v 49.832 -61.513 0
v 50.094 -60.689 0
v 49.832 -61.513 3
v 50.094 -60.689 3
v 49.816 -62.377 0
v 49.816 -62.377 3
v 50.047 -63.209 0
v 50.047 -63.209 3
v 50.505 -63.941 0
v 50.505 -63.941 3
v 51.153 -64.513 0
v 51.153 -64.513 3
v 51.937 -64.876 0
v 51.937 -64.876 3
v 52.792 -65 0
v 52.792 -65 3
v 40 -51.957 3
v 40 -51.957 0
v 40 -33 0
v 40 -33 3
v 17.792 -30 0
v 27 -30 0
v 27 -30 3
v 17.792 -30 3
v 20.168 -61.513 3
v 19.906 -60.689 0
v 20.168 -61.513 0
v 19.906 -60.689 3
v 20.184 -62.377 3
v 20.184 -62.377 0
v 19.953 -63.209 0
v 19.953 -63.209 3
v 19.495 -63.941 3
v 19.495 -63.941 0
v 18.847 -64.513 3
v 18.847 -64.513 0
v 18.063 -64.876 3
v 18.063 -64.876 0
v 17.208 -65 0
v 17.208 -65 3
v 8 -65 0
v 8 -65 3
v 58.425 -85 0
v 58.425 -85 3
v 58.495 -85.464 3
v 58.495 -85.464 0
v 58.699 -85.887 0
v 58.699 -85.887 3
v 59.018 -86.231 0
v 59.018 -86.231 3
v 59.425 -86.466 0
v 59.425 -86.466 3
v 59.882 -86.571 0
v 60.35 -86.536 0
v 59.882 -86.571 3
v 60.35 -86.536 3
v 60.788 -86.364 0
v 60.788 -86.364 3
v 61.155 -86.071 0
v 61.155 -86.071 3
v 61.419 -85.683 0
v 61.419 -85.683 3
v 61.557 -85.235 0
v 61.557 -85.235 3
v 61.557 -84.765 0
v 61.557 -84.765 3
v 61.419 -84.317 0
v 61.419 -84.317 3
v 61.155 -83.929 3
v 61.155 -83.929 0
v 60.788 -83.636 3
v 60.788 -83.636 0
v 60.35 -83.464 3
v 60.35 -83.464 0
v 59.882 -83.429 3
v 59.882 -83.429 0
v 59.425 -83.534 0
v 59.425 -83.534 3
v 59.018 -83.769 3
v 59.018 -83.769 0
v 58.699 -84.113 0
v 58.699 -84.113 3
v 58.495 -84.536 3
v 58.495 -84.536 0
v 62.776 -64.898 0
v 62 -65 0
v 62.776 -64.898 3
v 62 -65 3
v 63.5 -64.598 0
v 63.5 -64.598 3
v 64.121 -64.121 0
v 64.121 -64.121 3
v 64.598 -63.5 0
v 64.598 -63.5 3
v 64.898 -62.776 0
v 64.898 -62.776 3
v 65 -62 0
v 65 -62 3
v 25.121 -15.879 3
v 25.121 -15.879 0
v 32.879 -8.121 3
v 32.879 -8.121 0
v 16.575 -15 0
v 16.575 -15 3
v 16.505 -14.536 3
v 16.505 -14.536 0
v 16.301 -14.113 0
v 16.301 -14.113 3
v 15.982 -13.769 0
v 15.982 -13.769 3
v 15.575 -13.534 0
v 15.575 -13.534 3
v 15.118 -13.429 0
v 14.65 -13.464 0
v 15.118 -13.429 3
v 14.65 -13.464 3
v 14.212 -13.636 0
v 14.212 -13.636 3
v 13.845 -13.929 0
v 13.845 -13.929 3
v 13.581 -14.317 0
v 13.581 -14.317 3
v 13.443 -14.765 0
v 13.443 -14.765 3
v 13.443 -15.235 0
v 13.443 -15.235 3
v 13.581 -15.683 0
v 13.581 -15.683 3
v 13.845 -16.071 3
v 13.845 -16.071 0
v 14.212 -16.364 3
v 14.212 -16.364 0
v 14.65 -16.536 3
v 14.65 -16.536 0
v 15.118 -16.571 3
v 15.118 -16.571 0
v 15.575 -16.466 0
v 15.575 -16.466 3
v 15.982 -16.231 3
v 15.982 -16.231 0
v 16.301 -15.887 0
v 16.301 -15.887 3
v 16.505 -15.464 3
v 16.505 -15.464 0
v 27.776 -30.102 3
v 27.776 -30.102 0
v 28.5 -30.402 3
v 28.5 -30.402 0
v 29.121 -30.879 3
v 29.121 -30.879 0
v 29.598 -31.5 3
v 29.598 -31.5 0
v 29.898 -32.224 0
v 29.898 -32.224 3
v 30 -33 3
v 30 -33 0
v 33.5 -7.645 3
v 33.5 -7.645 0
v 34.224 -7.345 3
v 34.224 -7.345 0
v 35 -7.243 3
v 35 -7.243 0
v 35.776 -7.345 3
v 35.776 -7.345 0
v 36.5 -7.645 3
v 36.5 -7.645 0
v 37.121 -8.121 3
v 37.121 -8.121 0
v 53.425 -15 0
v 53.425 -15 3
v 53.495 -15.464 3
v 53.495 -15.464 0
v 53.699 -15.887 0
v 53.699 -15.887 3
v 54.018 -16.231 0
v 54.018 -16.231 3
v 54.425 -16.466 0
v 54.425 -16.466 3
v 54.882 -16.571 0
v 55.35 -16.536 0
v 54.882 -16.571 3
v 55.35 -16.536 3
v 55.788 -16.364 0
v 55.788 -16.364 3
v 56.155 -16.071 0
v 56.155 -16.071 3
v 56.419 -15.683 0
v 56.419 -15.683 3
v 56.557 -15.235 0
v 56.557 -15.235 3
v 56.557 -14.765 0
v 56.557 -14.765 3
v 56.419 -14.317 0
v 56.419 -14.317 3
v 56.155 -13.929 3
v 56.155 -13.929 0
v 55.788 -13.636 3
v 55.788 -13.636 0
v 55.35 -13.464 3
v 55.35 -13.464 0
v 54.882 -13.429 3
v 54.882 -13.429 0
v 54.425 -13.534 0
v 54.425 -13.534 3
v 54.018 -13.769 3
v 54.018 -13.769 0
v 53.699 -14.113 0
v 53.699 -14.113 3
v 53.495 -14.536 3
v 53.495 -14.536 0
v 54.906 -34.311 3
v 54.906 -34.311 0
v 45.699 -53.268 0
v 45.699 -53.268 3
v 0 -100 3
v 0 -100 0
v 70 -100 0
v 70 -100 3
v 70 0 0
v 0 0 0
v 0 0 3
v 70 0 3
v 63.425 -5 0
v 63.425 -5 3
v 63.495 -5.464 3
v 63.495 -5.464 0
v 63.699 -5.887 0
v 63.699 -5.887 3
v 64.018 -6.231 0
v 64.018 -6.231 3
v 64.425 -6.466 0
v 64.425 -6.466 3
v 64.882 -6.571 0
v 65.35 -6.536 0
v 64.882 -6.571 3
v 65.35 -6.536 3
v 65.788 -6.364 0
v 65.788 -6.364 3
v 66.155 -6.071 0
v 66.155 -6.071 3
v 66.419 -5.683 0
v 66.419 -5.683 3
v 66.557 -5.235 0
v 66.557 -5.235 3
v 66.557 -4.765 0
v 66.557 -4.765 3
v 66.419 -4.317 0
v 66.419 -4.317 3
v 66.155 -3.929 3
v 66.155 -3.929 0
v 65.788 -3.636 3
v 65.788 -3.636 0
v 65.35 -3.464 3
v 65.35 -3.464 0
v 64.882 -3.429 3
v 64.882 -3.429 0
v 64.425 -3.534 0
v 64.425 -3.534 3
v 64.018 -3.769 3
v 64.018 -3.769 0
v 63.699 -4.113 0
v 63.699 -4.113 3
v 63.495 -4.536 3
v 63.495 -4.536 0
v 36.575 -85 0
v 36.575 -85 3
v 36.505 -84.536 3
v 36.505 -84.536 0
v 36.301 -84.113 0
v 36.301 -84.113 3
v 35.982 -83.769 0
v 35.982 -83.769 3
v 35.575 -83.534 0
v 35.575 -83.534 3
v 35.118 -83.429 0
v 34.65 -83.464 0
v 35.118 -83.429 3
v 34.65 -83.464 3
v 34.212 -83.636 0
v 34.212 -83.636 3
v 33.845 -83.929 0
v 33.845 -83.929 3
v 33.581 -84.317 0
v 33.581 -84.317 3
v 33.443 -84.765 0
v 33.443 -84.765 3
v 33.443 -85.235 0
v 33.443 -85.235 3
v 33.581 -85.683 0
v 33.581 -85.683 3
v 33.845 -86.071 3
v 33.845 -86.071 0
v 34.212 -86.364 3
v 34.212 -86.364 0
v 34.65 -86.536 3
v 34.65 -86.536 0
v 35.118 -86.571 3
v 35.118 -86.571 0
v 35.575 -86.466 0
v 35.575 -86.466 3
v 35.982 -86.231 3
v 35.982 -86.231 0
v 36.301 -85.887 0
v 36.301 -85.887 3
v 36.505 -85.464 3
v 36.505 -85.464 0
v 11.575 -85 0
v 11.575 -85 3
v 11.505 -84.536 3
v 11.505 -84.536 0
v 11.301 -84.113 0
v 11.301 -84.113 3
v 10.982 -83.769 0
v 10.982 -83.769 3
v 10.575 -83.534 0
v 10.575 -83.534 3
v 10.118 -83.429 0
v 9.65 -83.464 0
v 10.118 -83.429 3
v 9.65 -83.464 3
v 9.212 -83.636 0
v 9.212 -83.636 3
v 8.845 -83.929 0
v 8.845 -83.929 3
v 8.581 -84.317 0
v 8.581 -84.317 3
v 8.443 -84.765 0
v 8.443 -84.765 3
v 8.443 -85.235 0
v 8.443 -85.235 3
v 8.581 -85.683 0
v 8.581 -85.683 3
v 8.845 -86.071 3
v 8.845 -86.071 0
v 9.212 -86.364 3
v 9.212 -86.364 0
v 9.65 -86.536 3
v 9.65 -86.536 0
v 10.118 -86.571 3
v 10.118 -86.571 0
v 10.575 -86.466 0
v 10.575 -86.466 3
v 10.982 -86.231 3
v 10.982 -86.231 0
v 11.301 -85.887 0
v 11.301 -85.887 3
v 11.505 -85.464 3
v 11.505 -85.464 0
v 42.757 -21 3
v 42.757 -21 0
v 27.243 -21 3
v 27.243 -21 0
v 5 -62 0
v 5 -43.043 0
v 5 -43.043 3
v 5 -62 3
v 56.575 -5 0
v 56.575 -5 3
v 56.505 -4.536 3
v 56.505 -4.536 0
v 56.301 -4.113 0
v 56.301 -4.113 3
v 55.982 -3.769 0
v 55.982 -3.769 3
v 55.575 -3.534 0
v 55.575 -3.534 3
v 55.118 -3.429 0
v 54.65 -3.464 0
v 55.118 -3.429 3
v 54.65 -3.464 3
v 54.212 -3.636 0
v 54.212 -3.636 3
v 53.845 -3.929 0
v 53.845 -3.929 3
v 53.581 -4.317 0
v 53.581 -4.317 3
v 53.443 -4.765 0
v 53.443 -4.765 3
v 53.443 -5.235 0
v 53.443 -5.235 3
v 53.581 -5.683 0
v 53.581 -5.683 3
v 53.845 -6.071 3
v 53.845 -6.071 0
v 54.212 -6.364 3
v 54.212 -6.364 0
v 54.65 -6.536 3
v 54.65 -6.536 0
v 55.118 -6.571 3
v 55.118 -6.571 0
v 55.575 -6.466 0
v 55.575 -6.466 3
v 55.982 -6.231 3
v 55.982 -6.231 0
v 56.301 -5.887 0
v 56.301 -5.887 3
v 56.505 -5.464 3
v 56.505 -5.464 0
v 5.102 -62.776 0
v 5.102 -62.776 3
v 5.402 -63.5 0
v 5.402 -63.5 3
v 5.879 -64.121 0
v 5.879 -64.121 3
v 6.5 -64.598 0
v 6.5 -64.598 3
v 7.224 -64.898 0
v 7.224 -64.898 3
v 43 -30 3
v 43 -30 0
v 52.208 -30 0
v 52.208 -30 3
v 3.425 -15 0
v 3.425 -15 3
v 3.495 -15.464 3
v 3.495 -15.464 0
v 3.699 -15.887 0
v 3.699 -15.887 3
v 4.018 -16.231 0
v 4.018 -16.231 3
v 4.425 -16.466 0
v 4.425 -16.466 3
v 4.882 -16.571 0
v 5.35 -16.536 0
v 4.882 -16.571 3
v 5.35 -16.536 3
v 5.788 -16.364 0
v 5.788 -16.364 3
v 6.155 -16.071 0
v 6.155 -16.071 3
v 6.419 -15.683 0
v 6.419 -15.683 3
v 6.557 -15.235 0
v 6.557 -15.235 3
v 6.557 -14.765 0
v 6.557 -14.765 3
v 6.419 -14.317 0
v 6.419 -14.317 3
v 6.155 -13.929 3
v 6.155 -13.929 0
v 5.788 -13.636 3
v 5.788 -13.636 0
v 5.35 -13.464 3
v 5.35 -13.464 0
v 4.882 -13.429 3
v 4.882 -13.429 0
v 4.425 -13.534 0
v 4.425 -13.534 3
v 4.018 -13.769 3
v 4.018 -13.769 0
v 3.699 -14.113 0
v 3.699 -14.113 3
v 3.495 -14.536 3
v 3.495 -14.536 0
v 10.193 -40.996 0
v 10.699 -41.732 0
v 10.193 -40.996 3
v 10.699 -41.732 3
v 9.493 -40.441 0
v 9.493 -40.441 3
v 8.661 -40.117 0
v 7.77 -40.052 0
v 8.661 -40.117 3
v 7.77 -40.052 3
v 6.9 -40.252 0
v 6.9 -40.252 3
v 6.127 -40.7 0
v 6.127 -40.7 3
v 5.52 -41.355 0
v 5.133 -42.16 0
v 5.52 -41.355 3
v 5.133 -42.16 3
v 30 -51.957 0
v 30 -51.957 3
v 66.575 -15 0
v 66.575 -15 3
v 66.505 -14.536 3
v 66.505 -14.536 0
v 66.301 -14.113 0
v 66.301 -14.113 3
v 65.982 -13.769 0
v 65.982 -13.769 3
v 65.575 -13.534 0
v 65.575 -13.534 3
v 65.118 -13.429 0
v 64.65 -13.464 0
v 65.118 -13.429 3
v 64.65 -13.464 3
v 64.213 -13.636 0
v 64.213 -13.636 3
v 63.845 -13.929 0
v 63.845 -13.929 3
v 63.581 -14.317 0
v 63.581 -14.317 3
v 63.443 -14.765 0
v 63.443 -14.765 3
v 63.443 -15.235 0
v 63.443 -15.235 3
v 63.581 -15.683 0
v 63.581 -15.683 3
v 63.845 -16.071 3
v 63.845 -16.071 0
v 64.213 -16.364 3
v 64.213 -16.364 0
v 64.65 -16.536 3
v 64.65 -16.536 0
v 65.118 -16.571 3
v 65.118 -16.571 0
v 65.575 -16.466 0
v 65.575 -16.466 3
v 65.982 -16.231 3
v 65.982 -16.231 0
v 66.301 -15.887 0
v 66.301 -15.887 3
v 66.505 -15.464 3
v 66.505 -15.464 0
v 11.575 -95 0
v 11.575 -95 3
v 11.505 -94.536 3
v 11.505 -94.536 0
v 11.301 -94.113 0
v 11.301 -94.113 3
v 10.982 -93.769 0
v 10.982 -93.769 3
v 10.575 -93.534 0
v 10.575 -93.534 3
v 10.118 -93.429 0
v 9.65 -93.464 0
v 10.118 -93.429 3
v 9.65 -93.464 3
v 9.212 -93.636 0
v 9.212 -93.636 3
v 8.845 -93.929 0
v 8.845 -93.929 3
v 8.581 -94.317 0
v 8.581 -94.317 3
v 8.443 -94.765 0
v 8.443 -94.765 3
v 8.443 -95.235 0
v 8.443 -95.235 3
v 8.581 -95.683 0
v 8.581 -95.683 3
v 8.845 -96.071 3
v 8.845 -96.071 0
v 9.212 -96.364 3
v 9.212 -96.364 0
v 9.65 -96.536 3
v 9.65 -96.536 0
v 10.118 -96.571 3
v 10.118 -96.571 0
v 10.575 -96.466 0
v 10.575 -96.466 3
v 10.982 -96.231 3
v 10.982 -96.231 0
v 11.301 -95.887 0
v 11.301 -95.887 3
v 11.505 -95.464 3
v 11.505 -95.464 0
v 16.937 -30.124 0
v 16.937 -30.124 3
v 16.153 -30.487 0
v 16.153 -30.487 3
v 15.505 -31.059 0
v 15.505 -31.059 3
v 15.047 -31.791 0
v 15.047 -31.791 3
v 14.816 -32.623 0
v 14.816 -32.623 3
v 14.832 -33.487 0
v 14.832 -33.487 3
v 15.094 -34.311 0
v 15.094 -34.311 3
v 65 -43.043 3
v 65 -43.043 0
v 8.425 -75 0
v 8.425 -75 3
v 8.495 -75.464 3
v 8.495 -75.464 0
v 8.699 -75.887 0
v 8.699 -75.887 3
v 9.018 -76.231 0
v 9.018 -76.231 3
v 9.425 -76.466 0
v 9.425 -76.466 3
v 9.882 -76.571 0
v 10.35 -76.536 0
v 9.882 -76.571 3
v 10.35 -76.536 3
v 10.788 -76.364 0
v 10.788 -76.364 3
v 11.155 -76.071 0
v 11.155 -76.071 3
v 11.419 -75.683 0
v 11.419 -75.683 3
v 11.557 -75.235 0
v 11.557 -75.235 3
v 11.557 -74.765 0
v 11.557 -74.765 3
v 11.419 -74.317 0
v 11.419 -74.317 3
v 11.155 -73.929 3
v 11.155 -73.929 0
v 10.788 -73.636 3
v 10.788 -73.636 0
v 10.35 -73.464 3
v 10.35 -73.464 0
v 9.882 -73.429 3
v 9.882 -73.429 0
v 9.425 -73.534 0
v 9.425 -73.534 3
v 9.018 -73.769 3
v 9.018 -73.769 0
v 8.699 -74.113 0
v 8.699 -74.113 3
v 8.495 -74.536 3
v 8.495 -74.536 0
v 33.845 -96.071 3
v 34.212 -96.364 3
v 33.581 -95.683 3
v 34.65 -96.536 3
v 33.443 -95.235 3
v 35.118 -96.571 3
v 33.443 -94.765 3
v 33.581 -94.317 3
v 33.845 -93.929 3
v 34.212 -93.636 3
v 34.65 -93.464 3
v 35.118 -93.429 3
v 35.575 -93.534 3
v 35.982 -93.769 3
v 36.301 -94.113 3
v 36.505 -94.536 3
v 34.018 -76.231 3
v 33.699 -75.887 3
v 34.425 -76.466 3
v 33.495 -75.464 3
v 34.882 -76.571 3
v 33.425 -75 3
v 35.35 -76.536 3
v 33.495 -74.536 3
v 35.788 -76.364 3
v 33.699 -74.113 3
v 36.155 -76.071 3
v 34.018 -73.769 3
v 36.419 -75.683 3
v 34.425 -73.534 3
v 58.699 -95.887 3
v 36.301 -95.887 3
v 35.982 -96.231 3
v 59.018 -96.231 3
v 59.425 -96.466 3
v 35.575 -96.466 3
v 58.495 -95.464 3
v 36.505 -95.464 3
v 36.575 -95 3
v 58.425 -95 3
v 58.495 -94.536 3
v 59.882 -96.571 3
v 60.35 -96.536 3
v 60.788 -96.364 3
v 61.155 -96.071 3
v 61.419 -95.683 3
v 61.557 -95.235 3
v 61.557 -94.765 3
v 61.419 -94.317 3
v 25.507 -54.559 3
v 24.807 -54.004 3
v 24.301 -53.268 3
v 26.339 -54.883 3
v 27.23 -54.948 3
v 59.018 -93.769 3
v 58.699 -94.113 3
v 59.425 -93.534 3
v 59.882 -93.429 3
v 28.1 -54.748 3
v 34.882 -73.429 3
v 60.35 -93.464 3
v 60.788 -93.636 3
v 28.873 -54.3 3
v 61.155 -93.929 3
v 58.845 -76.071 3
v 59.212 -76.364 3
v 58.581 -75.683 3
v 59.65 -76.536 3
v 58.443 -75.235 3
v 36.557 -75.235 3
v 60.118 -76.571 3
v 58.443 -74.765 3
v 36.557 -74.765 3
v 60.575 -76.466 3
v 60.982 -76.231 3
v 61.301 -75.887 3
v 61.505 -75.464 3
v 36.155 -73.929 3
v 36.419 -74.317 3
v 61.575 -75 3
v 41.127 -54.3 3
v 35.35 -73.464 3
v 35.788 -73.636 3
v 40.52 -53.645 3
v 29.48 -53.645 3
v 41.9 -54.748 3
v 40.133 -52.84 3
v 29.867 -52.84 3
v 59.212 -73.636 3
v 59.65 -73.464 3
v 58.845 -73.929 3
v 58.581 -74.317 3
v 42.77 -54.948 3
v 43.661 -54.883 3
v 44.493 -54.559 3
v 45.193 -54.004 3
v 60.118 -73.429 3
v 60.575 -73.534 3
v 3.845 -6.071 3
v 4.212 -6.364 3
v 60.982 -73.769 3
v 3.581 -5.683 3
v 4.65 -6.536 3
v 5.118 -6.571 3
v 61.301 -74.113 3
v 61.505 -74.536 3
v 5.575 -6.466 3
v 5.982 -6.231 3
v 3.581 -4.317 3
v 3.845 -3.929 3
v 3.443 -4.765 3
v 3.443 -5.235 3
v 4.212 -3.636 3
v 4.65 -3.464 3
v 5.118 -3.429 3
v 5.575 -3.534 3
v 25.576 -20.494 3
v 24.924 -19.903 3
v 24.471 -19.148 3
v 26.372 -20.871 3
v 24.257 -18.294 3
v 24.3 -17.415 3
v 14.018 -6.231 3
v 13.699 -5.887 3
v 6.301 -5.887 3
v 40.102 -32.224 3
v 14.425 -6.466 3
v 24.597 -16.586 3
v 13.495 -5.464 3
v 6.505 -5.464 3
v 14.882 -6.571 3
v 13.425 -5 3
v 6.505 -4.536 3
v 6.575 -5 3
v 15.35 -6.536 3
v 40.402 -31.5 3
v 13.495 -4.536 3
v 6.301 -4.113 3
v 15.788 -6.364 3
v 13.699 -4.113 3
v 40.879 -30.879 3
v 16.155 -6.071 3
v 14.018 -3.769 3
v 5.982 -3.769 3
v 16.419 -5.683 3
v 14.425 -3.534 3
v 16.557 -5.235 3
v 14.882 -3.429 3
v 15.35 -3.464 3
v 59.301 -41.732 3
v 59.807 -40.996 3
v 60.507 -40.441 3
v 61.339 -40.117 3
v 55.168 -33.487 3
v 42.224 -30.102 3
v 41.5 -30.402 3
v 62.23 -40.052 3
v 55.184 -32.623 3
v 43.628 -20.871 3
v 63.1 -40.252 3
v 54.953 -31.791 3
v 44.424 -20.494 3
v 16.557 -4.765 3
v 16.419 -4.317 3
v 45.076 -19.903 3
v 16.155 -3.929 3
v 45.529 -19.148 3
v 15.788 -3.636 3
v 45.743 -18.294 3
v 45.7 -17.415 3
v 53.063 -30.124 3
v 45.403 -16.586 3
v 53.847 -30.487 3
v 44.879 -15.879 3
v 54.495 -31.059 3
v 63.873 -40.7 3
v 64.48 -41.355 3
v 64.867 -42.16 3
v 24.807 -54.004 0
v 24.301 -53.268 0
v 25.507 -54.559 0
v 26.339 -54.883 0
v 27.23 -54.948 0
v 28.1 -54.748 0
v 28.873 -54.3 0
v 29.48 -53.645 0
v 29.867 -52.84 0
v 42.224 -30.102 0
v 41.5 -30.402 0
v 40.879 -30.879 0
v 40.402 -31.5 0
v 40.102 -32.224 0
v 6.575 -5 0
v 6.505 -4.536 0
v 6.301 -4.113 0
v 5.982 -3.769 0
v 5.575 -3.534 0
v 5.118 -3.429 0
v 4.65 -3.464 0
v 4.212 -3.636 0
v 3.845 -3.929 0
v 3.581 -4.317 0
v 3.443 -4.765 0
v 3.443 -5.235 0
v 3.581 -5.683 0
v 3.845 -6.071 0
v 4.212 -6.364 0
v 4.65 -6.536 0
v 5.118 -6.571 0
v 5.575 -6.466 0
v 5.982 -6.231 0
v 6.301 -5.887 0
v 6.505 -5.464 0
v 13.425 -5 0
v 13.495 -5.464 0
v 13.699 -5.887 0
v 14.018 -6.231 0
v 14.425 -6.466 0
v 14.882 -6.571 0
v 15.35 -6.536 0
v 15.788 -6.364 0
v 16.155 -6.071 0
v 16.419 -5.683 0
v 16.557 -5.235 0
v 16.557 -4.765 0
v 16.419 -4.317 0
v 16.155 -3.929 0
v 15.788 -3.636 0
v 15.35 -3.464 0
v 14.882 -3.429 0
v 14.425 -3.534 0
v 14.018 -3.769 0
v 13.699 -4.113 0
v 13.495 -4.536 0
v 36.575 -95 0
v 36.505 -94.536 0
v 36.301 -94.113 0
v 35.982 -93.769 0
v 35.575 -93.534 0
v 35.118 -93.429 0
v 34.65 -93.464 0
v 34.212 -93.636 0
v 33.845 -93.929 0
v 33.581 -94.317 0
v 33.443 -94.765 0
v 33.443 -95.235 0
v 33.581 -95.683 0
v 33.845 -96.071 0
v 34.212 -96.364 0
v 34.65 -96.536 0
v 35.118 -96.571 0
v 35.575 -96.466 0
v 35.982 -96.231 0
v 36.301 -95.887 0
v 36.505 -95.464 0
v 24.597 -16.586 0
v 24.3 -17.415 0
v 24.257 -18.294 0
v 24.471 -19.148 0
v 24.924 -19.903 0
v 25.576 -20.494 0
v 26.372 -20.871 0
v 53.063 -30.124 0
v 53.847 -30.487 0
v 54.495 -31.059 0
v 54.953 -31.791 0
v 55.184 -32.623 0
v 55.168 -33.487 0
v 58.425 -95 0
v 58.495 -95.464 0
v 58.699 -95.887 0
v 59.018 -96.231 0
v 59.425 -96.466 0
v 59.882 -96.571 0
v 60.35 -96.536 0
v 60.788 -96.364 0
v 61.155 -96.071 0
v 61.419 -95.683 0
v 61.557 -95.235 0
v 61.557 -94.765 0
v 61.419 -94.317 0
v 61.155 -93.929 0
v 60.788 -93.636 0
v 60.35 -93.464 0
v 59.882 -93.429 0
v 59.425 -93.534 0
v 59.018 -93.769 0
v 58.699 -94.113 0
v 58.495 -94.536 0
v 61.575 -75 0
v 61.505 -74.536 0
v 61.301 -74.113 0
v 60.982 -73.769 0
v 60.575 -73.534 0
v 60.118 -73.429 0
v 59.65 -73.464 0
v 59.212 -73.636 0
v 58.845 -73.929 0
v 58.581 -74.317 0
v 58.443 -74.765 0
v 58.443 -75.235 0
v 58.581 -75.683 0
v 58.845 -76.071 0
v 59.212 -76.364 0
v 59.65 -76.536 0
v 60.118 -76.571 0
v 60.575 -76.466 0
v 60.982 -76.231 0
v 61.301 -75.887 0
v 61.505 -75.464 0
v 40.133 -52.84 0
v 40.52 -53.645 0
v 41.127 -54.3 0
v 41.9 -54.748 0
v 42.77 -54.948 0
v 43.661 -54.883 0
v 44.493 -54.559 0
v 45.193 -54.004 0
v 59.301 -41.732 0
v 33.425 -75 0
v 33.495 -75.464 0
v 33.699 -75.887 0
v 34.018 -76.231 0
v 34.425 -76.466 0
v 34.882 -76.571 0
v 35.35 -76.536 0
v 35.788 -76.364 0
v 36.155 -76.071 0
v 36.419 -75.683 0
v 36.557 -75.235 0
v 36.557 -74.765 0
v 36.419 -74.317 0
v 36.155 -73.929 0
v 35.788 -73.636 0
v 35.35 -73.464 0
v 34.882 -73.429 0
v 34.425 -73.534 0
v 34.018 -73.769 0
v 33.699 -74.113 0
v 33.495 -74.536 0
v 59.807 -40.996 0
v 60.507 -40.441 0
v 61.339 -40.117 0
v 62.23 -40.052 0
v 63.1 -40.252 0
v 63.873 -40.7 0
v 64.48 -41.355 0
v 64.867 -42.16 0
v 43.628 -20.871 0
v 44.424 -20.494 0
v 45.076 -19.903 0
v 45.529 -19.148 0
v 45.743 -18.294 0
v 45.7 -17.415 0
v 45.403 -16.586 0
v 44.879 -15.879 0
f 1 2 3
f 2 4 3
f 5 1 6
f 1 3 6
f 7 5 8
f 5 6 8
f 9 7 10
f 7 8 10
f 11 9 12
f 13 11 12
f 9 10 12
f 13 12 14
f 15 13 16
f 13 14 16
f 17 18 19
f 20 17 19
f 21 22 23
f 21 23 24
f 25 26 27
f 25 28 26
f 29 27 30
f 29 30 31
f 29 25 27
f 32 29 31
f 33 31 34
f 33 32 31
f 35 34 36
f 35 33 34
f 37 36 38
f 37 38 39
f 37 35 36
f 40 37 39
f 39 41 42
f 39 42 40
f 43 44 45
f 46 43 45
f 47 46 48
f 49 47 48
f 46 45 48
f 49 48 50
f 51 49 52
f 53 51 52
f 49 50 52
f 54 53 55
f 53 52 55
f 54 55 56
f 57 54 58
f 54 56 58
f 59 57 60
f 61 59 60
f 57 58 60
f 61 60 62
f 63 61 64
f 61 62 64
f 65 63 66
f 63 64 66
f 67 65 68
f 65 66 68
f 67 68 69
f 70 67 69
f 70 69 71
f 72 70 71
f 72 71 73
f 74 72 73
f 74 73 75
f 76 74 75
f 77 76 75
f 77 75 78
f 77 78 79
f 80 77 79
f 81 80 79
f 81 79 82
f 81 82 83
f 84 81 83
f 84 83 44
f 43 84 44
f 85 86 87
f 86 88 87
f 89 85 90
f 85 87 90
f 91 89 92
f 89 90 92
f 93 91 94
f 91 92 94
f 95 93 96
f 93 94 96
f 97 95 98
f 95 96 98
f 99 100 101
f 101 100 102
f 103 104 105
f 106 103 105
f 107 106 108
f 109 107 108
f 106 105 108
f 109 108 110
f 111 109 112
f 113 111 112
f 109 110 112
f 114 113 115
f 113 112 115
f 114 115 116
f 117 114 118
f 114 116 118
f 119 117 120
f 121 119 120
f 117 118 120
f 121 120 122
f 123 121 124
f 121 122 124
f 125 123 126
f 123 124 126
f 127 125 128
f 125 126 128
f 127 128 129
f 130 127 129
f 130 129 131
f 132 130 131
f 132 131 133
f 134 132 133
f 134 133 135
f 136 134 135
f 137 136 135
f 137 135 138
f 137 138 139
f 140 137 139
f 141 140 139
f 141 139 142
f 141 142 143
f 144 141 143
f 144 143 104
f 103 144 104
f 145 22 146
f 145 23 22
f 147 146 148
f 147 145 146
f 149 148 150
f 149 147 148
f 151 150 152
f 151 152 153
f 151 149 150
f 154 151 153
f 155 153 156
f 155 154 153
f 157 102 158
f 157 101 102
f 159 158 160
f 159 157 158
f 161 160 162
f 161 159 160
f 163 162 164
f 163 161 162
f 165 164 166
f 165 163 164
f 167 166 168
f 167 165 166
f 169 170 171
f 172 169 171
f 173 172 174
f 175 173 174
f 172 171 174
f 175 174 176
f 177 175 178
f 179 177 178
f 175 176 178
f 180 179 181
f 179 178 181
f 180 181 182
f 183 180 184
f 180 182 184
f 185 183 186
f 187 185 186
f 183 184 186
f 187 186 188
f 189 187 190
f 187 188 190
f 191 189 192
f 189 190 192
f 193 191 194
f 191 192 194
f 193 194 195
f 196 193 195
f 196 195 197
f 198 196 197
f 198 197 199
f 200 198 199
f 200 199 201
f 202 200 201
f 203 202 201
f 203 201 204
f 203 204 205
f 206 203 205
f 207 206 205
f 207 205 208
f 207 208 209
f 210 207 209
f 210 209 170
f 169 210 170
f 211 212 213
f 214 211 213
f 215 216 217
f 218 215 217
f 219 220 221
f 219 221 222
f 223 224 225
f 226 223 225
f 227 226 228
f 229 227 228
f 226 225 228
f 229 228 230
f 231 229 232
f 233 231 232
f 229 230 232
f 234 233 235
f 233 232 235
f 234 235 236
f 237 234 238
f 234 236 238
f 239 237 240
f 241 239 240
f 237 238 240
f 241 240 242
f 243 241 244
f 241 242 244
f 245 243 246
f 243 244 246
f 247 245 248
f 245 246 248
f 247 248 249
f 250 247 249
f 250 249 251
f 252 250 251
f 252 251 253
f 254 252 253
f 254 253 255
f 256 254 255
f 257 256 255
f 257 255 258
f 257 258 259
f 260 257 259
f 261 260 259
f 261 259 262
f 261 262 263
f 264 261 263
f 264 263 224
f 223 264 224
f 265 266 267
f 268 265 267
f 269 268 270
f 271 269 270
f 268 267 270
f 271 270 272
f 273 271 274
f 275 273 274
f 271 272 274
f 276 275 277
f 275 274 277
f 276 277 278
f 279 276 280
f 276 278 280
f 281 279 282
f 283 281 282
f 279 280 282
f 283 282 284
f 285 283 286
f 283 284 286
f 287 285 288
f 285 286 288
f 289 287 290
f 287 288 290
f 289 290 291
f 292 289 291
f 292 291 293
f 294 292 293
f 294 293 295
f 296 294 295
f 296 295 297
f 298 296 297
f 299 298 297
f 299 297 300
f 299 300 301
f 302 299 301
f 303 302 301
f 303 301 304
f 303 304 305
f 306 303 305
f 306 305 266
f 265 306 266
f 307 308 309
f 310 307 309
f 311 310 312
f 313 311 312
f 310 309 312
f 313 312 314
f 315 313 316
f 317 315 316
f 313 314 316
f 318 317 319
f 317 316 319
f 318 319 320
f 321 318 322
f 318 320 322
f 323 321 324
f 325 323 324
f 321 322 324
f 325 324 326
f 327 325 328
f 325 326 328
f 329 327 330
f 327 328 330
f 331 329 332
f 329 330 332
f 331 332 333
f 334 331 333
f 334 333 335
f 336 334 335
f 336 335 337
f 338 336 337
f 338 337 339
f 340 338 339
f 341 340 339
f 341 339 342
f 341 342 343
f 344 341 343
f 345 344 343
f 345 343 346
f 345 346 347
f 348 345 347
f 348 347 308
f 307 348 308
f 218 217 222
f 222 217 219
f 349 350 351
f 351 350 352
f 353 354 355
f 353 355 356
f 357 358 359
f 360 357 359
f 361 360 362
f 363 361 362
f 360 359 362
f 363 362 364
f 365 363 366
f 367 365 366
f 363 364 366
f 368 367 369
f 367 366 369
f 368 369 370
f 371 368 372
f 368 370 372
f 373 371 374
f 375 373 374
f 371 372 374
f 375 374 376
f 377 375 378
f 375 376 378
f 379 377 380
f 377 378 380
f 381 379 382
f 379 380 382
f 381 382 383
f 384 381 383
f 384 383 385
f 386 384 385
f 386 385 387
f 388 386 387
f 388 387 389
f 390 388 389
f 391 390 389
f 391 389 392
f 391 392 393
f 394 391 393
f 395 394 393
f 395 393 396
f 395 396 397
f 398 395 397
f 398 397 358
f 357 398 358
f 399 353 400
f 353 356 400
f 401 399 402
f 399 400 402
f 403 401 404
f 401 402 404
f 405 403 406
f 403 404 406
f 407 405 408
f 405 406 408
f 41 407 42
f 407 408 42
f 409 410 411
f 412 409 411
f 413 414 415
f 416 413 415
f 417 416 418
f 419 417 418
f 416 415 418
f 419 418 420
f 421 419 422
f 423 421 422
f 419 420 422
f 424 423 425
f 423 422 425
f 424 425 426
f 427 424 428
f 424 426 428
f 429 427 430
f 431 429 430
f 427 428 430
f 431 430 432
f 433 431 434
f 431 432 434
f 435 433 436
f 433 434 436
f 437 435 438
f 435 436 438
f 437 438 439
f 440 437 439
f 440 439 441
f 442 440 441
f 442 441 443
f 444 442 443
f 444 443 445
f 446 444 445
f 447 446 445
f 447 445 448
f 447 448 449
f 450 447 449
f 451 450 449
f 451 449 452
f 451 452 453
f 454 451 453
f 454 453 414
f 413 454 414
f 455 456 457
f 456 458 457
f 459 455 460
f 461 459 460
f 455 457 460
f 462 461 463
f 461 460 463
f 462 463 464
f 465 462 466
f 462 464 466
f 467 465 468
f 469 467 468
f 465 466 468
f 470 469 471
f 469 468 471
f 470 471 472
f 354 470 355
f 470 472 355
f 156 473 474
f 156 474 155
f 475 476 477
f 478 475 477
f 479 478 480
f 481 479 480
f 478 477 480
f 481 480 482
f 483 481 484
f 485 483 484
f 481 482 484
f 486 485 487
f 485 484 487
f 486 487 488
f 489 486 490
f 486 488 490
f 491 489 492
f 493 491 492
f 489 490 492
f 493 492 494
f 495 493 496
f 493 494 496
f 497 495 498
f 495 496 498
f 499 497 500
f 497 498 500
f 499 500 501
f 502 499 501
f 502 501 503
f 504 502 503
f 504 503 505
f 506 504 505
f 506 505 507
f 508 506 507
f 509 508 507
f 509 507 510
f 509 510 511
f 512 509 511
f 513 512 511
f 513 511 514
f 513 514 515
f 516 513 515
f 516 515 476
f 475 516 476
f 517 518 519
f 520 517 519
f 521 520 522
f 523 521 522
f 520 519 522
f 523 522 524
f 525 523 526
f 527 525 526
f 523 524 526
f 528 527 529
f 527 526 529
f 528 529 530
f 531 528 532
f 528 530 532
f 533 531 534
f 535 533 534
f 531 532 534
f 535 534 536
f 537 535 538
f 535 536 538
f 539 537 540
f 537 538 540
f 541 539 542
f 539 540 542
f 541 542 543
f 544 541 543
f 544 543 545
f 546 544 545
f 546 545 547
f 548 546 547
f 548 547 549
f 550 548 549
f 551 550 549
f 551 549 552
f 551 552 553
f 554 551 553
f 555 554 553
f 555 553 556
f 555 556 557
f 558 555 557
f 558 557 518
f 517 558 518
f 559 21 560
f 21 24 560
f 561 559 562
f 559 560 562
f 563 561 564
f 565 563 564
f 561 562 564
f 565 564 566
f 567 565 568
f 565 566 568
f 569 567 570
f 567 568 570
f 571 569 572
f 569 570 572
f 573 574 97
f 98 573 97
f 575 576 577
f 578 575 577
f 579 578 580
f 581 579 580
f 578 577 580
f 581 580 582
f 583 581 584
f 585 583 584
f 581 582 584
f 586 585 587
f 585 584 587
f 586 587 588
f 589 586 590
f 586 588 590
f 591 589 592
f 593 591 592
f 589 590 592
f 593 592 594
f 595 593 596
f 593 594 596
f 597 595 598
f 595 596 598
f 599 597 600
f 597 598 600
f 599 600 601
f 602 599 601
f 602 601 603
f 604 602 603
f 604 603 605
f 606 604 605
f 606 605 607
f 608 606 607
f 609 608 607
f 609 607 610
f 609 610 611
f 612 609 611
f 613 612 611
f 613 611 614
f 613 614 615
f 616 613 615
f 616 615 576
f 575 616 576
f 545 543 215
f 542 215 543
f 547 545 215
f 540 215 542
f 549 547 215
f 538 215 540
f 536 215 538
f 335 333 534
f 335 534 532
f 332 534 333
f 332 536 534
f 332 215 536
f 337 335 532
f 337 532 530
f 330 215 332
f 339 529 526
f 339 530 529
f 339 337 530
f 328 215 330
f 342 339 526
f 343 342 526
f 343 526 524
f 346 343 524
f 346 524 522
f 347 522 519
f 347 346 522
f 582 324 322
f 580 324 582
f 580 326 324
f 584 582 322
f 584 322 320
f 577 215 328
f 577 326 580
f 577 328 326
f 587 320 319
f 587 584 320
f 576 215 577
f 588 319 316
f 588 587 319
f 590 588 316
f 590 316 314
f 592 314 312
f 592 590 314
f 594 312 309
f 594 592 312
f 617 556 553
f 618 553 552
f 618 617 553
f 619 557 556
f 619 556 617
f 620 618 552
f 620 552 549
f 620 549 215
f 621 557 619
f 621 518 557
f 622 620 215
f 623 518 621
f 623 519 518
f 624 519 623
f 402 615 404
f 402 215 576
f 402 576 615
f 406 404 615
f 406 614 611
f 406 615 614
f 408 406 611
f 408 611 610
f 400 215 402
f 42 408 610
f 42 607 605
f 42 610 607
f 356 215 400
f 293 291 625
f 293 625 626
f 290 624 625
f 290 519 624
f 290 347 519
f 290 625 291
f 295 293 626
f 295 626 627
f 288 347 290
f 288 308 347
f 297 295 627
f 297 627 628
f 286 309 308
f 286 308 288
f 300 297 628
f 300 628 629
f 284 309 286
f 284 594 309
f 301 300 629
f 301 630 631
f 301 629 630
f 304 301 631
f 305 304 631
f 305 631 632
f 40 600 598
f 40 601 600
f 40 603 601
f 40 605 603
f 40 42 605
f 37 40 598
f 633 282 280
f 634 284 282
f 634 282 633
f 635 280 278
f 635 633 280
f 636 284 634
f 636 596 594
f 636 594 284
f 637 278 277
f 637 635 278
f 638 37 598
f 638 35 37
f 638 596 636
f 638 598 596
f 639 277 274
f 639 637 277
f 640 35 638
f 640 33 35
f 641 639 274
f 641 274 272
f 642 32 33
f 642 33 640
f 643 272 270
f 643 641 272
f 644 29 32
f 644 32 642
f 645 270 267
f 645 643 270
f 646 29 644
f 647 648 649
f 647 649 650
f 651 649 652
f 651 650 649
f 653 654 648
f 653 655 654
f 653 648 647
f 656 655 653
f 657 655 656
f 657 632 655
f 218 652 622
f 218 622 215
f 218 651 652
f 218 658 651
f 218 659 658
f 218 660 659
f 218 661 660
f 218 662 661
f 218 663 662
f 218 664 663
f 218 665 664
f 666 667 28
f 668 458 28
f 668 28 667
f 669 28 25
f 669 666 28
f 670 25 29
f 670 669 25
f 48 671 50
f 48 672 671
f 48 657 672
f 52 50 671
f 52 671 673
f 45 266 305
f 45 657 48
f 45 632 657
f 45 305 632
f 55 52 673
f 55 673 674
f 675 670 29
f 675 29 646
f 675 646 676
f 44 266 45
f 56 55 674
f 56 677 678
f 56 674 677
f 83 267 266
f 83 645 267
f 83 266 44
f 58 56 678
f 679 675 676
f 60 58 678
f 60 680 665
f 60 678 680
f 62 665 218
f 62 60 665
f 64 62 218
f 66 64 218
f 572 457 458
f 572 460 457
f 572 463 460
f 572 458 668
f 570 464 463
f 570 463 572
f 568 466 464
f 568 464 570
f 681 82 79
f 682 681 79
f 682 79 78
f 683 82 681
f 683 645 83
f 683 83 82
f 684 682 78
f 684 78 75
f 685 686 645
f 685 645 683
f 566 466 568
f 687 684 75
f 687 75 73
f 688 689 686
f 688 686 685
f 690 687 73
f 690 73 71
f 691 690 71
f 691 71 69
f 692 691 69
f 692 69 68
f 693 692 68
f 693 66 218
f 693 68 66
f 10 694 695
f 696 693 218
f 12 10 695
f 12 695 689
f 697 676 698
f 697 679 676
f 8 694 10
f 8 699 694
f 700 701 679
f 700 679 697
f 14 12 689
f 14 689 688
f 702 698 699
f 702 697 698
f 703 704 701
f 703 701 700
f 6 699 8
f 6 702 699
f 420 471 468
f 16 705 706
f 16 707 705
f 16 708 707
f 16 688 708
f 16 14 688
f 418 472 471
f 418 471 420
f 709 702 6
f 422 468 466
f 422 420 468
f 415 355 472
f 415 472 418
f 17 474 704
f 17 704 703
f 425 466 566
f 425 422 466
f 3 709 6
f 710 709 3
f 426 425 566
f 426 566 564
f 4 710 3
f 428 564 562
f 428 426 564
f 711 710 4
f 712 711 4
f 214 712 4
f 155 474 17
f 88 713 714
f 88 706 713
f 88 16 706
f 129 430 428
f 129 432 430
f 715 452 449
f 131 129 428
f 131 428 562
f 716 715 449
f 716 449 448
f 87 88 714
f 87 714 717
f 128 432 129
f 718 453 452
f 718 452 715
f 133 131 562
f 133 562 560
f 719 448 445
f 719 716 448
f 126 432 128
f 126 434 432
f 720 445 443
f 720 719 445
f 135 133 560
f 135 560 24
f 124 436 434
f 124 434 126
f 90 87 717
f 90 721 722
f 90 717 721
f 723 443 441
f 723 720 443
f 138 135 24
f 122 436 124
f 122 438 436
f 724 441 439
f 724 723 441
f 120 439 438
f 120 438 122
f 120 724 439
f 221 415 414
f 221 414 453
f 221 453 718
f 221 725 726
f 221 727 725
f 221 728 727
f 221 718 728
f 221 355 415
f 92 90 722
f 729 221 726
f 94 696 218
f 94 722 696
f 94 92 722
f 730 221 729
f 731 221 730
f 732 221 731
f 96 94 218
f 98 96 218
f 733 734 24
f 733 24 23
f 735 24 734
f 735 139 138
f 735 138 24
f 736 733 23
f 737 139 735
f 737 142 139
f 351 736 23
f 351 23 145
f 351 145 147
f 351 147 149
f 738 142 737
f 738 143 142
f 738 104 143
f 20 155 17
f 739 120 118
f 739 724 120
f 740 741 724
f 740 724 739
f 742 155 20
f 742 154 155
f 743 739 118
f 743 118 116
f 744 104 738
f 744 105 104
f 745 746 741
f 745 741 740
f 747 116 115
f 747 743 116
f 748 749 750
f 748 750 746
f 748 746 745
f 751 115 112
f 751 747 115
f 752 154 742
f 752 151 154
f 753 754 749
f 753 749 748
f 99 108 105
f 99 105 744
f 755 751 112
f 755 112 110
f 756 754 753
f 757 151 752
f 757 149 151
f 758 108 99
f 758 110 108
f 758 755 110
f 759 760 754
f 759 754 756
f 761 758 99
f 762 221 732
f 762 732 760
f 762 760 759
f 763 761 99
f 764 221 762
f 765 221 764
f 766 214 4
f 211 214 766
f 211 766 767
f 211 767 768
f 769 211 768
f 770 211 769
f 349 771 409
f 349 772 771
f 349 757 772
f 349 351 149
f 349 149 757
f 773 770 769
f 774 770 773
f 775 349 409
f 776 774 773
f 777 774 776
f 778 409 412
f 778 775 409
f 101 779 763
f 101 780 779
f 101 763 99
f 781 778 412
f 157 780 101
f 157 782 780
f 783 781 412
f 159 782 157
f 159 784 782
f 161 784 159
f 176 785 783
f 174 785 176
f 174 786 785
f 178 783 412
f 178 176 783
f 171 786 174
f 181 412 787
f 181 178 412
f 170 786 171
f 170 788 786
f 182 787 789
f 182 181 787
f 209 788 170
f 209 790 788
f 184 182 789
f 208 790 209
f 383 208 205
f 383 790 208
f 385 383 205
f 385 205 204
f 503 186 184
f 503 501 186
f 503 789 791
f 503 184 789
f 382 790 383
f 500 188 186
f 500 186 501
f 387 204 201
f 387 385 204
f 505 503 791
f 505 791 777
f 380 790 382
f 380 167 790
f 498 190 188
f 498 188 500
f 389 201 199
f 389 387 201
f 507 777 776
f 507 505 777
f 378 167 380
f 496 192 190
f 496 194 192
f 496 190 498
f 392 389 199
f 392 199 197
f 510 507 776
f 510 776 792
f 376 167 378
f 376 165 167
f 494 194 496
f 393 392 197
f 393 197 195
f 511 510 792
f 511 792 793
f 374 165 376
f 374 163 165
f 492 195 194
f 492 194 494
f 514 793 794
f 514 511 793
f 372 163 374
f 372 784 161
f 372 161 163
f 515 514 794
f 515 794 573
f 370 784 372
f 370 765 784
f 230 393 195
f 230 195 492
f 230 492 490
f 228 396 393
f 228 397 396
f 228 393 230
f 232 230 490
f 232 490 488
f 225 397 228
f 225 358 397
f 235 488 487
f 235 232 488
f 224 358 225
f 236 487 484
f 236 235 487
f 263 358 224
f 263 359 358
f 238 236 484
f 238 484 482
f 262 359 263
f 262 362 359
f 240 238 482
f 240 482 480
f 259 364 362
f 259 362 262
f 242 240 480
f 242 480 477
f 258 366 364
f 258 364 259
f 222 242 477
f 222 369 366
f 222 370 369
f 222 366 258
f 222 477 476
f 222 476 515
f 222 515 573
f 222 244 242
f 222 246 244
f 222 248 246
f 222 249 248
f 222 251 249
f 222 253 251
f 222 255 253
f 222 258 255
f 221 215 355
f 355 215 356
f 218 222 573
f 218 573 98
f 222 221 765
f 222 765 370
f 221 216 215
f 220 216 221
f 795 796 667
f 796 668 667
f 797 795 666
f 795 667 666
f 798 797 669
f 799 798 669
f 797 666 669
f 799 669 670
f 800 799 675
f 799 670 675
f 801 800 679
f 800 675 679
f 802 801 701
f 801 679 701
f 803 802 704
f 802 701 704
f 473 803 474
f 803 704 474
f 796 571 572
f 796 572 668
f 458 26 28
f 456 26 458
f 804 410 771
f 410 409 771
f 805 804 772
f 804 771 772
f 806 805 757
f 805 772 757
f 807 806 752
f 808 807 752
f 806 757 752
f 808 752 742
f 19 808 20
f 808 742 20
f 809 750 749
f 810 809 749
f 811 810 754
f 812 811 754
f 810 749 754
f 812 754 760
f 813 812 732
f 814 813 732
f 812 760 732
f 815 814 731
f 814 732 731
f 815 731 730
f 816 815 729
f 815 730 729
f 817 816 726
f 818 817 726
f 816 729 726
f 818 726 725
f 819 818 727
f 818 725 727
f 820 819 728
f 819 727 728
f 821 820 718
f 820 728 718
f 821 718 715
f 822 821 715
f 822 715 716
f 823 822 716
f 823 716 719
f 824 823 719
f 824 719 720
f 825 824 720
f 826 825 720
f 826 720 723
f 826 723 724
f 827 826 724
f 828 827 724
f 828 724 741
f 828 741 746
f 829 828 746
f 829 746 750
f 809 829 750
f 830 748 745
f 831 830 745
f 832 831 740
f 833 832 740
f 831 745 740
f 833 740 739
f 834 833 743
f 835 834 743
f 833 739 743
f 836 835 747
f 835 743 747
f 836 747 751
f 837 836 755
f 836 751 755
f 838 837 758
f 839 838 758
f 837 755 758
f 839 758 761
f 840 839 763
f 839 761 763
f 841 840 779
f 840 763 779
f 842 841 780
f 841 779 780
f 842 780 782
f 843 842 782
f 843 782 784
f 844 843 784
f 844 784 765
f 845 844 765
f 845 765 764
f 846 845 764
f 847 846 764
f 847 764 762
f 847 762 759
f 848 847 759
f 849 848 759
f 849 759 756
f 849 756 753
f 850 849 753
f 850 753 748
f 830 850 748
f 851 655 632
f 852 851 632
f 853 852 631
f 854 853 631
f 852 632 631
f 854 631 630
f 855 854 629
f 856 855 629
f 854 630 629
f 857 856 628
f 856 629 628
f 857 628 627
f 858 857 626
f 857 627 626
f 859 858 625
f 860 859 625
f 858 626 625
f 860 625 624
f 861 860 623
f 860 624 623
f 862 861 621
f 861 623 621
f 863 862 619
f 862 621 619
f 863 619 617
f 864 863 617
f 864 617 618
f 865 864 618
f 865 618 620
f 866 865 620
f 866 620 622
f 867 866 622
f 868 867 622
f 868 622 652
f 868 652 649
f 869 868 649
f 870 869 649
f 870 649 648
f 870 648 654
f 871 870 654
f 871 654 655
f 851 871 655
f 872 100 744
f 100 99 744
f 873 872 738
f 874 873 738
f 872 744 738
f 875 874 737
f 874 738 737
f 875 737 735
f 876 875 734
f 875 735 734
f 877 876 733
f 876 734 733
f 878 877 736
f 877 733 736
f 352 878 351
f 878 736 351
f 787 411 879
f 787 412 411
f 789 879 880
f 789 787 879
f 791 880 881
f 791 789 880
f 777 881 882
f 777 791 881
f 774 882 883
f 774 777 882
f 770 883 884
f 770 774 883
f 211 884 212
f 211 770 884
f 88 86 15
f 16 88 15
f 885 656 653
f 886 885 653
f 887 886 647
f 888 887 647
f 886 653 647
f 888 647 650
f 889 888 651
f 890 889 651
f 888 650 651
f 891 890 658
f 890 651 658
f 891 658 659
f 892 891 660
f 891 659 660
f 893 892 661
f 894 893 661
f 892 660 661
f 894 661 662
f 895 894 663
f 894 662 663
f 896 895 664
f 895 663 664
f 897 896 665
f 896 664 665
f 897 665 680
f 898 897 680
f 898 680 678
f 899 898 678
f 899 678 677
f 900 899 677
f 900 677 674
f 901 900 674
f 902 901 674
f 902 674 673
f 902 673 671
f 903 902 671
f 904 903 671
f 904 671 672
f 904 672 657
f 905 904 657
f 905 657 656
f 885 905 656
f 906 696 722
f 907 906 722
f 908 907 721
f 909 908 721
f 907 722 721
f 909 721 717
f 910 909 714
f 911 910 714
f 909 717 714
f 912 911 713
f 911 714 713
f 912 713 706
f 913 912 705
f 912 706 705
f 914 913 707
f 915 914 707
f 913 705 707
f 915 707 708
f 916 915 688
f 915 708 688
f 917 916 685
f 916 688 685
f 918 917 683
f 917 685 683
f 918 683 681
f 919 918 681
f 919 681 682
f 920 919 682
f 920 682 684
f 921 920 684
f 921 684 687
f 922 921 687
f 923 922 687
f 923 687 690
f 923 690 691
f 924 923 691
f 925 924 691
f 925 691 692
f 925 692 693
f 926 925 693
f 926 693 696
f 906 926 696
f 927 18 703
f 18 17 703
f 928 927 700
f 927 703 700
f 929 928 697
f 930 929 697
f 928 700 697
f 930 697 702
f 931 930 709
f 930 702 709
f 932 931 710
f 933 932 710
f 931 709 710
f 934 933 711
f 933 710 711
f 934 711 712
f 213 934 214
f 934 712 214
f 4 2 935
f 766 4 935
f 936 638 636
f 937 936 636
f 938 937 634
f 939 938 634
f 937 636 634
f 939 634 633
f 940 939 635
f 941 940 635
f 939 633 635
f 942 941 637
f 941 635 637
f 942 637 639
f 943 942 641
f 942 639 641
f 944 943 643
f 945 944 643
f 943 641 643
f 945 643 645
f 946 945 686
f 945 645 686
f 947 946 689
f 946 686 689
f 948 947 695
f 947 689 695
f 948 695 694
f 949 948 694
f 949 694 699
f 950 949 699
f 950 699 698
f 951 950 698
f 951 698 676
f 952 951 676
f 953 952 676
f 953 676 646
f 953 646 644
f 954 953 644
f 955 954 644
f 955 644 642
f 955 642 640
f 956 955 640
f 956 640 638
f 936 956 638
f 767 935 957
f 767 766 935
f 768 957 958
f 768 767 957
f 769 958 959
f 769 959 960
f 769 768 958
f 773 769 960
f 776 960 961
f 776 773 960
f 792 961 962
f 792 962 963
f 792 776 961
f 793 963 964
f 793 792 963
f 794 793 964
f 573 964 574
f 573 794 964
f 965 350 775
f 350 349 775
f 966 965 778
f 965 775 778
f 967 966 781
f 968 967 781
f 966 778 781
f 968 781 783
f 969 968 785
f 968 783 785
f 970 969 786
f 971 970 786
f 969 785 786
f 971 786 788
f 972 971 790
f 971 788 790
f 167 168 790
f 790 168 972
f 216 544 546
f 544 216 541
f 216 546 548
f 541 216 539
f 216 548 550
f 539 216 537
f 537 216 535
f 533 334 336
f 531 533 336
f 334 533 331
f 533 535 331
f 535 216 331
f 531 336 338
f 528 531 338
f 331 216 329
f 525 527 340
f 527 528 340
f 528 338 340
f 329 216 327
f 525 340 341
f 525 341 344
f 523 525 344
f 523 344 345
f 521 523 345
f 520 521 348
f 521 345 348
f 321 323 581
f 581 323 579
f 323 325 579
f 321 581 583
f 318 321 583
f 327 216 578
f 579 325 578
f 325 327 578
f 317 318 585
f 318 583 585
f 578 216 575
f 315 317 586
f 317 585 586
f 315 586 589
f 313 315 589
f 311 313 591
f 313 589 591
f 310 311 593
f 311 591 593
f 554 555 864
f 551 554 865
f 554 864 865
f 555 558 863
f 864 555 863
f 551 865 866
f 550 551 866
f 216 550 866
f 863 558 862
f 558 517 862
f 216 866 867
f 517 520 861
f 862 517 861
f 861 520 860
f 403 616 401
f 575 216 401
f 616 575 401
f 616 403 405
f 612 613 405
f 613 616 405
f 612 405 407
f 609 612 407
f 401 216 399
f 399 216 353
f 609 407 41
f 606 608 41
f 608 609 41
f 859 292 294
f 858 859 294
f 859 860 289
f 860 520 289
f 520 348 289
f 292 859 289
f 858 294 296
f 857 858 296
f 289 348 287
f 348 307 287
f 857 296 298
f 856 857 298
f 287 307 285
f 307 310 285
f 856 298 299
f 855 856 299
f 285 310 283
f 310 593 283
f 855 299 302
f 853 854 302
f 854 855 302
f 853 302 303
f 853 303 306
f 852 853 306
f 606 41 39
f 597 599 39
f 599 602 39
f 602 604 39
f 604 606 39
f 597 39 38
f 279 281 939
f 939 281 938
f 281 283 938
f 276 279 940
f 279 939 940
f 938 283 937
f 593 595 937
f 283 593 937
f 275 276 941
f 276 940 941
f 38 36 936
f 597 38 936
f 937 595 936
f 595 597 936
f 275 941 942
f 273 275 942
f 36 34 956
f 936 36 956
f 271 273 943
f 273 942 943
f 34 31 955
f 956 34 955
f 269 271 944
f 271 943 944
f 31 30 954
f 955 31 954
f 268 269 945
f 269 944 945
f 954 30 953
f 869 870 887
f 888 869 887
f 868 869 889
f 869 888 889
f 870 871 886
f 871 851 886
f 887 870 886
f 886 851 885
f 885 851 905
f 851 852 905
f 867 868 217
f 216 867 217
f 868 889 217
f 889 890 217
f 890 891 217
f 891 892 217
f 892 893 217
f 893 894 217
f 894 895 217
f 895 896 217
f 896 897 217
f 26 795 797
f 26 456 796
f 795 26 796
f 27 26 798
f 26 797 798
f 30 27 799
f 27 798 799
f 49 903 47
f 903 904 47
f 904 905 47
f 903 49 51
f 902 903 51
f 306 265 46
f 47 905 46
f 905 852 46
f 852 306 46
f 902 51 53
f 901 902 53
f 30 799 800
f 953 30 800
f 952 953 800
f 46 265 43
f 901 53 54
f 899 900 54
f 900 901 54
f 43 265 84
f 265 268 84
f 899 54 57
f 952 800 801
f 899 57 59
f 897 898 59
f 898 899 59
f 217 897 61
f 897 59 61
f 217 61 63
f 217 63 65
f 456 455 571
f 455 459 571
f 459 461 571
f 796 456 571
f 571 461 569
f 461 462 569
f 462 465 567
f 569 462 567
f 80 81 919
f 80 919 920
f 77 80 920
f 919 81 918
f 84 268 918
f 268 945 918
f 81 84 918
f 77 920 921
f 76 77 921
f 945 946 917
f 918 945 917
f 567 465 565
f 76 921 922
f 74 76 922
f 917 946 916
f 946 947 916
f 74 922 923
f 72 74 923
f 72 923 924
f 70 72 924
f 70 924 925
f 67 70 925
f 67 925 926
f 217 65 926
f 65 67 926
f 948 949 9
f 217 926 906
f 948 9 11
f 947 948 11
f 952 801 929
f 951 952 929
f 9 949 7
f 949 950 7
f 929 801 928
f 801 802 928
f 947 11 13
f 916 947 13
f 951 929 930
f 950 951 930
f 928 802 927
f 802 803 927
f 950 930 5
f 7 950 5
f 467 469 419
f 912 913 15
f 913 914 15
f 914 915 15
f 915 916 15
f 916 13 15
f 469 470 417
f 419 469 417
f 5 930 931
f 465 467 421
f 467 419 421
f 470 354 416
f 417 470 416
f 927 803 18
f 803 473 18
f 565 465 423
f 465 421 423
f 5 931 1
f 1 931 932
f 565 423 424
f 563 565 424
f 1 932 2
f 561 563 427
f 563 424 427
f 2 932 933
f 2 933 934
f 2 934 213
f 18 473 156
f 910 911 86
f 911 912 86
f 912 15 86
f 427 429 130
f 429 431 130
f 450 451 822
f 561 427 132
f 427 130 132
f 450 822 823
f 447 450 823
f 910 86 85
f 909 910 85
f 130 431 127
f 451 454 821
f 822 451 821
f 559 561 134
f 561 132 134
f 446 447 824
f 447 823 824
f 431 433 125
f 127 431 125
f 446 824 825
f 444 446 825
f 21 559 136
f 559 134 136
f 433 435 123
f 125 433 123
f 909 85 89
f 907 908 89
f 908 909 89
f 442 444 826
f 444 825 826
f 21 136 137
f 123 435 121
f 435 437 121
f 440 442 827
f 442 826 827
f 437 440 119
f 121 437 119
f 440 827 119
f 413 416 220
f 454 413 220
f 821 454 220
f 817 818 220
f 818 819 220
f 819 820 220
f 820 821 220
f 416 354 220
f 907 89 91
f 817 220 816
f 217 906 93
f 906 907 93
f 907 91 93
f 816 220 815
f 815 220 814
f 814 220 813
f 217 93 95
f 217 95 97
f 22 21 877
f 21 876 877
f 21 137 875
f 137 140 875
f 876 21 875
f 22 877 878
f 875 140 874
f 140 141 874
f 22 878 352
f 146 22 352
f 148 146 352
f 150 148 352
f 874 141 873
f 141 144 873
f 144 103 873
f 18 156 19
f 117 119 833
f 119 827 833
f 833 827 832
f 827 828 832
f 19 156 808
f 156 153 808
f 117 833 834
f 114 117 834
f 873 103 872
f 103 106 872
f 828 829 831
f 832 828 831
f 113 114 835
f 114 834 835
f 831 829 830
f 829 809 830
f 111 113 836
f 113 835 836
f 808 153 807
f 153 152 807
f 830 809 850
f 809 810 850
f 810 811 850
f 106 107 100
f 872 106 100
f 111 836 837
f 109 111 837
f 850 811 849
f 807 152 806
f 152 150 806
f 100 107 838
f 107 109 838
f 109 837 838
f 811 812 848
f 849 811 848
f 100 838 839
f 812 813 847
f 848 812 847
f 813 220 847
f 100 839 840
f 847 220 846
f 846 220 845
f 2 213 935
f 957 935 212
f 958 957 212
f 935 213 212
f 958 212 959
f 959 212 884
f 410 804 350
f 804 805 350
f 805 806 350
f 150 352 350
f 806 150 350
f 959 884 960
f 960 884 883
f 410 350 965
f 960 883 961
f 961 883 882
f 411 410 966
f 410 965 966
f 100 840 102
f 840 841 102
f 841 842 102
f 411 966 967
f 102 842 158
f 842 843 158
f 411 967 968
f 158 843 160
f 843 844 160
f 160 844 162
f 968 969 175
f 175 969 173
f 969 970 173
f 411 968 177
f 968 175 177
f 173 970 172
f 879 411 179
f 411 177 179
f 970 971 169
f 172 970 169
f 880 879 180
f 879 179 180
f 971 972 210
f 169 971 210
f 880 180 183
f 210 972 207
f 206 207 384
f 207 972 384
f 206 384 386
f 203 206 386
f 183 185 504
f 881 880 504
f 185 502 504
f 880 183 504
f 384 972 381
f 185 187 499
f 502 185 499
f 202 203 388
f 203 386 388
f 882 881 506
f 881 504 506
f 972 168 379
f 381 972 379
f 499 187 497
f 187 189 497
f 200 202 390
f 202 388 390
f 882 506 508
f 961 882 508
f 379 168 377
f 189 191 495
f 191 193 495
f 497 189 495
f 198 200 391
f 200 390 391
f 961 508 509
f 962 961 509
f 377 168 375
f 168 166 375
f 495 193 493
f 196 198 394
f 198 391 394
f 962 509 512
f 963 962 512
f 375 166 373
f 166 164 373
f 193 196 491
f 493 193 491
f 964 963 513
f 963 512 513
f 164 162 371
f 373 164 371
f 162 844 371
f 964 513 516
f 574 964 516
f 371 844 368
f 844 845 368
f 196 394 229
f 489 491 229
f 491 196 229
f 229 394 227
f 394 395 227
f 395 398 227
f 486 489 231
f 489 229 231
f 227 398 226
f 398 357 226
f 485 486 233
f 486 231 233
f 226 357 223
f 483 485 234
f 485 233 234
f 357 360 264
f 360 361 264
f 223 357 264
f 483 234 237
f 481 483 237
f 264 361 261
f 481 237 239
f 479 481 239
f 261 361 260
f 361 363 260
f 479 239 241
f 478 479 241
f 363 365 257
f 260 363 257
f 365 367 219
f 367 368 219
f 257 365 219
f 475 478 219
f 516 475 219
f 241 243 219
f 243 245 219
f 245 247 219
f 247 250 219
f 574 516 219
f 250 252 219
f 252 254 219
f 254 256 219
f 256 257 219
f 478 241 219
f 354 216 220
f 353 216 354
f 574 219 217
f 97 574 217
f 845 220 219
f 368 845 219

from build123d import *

# Parameters (mm, degrees)
SKETCH_1_W          = 70
SKETCH_1_H          = 100
EXTRUDE_1_DEPTH     = 3
SKETCH_2_R          = 1.575
CUT_EXTRUDE_1_DEPTH = 123.102416029
CUT_EXTRUDE_2_DEPTH = 123.102416029
FILLET_2_R          = 3


with BuildPart() as part:
    # 草图1 → 凸台-拉伸1 (new body)
    with BuildSketch(Plane.XY):
        with Locations((35, -50)):
            Rectangle(SKETCH_1_W, SKETCH_1_H)
    extrude(amount=EXTRUDE_1_DEPTH)

    # 草图2 → 切除-拉伸1 (cut, through all)
    with BuildSketch(Plane.XY.offset(3)):
        with Locations((5, -5)):
            Circle(SKETCH_2_R)
        with Locations(Location((15, -5, 0), (0, 0, 180))):
            Circle(SKETCH_2_R)
        with Locations((15, -15)):
            Circle(SKETCH_2_R)
        with Locations(Location((5, -15, 0), (0, 0, 180))):
            Circle(SKETCH_2_R)
        with Locations((65, -15)):
            Circle(SKETCH_2_R)
        with Locations(Location((55, -15, 0), (0, 0, 180))):
            Circle(SKETCH_2_R)
        with Locations((55, -5)):
            Circle(SKETCH_2_R)
        with Locations(Location((65, -5, 0), (0, 0, 180))):
            Circle(SKETCH_2_R)
        with Locations((10, -85)):
            Circle(SKETCH_2_R)
        with Locations((35, -85)):
            Circle(SKETCH_2_R)
        with Locations(Location((60, -85, 0), (0, 0, 180))):
            Circle(SKETCH_2_R)
        with Locations((60, -75)):
            Circle(SKETCH_2_R)
        with Locations(Location((35, -75, 0), (0, 0, 180))):
            Circle(SKETCH_2_R)
        with Locations(Location((10, -75, 0), (0, 0, 180))):
            Circle(SKETCH_2_R)
        with Locations((10, -95)):
            Circle(SKETCH_2_R)
        with Locations((35, -95)):
            Circle(SKETCH_2_R)
        with Locations(Location((60, -95, 0), (0, 0, 180))):
            Circle(SKETCH_2_R)
    extrude(amount=-CUT_EXTRUDE_1_DEPTH, mode=Mode.SUBTRACT)

    # 草图3 → 切除-拉伸2 (cut, through all)
    with BuildSketch(Plane(origin=(0, 0, 0), x_dir=(-1, 0, 0), z_dir=(0, 0, -1))):
        Polygon((-65, -30), (-65, -65), (-48, -65), align=None)
        Polygon((-57, -30), (-40, -65), (-40, -30), align=None)
        Polygon((-30, -30), (-13, -30), (-30, -65), align=None)
        Polygon((-22, -65), (-5, -30), (-5, -65), align=None)
        Polygon((-35, -6), (-50, -21), (-20, -21), align=None)
    extrude(amount=-CUT_EXTRUDE_2_DEPTH, mode=Mode.SUBTRACT)

    # 圆角2
    fillet_2_edges = [part.edges().sort_by_distance(p)[0] for p in [
        (57, -30, 1.5),
        (40, -30, 1.5),
        (40, -65, 1.5),
        (30, -65, 1.5),
        (30, -30, 1.5),
        (13, -30, 1.5),
        (5, -65, 1.5),
        (22, -65, 1.5),
        (5, -30, 1.5),
        (35, -6, 1.5),
        (20, -21, 1.5),
        (50, -21, 1.5),
        (65, -30, 1.5),
        (48, -65, 1.5),
        (65, -65, 1.5),
    ]]
    fillet(fillet_2_edges, radius=FILLET_2_R)


solid = part.part
